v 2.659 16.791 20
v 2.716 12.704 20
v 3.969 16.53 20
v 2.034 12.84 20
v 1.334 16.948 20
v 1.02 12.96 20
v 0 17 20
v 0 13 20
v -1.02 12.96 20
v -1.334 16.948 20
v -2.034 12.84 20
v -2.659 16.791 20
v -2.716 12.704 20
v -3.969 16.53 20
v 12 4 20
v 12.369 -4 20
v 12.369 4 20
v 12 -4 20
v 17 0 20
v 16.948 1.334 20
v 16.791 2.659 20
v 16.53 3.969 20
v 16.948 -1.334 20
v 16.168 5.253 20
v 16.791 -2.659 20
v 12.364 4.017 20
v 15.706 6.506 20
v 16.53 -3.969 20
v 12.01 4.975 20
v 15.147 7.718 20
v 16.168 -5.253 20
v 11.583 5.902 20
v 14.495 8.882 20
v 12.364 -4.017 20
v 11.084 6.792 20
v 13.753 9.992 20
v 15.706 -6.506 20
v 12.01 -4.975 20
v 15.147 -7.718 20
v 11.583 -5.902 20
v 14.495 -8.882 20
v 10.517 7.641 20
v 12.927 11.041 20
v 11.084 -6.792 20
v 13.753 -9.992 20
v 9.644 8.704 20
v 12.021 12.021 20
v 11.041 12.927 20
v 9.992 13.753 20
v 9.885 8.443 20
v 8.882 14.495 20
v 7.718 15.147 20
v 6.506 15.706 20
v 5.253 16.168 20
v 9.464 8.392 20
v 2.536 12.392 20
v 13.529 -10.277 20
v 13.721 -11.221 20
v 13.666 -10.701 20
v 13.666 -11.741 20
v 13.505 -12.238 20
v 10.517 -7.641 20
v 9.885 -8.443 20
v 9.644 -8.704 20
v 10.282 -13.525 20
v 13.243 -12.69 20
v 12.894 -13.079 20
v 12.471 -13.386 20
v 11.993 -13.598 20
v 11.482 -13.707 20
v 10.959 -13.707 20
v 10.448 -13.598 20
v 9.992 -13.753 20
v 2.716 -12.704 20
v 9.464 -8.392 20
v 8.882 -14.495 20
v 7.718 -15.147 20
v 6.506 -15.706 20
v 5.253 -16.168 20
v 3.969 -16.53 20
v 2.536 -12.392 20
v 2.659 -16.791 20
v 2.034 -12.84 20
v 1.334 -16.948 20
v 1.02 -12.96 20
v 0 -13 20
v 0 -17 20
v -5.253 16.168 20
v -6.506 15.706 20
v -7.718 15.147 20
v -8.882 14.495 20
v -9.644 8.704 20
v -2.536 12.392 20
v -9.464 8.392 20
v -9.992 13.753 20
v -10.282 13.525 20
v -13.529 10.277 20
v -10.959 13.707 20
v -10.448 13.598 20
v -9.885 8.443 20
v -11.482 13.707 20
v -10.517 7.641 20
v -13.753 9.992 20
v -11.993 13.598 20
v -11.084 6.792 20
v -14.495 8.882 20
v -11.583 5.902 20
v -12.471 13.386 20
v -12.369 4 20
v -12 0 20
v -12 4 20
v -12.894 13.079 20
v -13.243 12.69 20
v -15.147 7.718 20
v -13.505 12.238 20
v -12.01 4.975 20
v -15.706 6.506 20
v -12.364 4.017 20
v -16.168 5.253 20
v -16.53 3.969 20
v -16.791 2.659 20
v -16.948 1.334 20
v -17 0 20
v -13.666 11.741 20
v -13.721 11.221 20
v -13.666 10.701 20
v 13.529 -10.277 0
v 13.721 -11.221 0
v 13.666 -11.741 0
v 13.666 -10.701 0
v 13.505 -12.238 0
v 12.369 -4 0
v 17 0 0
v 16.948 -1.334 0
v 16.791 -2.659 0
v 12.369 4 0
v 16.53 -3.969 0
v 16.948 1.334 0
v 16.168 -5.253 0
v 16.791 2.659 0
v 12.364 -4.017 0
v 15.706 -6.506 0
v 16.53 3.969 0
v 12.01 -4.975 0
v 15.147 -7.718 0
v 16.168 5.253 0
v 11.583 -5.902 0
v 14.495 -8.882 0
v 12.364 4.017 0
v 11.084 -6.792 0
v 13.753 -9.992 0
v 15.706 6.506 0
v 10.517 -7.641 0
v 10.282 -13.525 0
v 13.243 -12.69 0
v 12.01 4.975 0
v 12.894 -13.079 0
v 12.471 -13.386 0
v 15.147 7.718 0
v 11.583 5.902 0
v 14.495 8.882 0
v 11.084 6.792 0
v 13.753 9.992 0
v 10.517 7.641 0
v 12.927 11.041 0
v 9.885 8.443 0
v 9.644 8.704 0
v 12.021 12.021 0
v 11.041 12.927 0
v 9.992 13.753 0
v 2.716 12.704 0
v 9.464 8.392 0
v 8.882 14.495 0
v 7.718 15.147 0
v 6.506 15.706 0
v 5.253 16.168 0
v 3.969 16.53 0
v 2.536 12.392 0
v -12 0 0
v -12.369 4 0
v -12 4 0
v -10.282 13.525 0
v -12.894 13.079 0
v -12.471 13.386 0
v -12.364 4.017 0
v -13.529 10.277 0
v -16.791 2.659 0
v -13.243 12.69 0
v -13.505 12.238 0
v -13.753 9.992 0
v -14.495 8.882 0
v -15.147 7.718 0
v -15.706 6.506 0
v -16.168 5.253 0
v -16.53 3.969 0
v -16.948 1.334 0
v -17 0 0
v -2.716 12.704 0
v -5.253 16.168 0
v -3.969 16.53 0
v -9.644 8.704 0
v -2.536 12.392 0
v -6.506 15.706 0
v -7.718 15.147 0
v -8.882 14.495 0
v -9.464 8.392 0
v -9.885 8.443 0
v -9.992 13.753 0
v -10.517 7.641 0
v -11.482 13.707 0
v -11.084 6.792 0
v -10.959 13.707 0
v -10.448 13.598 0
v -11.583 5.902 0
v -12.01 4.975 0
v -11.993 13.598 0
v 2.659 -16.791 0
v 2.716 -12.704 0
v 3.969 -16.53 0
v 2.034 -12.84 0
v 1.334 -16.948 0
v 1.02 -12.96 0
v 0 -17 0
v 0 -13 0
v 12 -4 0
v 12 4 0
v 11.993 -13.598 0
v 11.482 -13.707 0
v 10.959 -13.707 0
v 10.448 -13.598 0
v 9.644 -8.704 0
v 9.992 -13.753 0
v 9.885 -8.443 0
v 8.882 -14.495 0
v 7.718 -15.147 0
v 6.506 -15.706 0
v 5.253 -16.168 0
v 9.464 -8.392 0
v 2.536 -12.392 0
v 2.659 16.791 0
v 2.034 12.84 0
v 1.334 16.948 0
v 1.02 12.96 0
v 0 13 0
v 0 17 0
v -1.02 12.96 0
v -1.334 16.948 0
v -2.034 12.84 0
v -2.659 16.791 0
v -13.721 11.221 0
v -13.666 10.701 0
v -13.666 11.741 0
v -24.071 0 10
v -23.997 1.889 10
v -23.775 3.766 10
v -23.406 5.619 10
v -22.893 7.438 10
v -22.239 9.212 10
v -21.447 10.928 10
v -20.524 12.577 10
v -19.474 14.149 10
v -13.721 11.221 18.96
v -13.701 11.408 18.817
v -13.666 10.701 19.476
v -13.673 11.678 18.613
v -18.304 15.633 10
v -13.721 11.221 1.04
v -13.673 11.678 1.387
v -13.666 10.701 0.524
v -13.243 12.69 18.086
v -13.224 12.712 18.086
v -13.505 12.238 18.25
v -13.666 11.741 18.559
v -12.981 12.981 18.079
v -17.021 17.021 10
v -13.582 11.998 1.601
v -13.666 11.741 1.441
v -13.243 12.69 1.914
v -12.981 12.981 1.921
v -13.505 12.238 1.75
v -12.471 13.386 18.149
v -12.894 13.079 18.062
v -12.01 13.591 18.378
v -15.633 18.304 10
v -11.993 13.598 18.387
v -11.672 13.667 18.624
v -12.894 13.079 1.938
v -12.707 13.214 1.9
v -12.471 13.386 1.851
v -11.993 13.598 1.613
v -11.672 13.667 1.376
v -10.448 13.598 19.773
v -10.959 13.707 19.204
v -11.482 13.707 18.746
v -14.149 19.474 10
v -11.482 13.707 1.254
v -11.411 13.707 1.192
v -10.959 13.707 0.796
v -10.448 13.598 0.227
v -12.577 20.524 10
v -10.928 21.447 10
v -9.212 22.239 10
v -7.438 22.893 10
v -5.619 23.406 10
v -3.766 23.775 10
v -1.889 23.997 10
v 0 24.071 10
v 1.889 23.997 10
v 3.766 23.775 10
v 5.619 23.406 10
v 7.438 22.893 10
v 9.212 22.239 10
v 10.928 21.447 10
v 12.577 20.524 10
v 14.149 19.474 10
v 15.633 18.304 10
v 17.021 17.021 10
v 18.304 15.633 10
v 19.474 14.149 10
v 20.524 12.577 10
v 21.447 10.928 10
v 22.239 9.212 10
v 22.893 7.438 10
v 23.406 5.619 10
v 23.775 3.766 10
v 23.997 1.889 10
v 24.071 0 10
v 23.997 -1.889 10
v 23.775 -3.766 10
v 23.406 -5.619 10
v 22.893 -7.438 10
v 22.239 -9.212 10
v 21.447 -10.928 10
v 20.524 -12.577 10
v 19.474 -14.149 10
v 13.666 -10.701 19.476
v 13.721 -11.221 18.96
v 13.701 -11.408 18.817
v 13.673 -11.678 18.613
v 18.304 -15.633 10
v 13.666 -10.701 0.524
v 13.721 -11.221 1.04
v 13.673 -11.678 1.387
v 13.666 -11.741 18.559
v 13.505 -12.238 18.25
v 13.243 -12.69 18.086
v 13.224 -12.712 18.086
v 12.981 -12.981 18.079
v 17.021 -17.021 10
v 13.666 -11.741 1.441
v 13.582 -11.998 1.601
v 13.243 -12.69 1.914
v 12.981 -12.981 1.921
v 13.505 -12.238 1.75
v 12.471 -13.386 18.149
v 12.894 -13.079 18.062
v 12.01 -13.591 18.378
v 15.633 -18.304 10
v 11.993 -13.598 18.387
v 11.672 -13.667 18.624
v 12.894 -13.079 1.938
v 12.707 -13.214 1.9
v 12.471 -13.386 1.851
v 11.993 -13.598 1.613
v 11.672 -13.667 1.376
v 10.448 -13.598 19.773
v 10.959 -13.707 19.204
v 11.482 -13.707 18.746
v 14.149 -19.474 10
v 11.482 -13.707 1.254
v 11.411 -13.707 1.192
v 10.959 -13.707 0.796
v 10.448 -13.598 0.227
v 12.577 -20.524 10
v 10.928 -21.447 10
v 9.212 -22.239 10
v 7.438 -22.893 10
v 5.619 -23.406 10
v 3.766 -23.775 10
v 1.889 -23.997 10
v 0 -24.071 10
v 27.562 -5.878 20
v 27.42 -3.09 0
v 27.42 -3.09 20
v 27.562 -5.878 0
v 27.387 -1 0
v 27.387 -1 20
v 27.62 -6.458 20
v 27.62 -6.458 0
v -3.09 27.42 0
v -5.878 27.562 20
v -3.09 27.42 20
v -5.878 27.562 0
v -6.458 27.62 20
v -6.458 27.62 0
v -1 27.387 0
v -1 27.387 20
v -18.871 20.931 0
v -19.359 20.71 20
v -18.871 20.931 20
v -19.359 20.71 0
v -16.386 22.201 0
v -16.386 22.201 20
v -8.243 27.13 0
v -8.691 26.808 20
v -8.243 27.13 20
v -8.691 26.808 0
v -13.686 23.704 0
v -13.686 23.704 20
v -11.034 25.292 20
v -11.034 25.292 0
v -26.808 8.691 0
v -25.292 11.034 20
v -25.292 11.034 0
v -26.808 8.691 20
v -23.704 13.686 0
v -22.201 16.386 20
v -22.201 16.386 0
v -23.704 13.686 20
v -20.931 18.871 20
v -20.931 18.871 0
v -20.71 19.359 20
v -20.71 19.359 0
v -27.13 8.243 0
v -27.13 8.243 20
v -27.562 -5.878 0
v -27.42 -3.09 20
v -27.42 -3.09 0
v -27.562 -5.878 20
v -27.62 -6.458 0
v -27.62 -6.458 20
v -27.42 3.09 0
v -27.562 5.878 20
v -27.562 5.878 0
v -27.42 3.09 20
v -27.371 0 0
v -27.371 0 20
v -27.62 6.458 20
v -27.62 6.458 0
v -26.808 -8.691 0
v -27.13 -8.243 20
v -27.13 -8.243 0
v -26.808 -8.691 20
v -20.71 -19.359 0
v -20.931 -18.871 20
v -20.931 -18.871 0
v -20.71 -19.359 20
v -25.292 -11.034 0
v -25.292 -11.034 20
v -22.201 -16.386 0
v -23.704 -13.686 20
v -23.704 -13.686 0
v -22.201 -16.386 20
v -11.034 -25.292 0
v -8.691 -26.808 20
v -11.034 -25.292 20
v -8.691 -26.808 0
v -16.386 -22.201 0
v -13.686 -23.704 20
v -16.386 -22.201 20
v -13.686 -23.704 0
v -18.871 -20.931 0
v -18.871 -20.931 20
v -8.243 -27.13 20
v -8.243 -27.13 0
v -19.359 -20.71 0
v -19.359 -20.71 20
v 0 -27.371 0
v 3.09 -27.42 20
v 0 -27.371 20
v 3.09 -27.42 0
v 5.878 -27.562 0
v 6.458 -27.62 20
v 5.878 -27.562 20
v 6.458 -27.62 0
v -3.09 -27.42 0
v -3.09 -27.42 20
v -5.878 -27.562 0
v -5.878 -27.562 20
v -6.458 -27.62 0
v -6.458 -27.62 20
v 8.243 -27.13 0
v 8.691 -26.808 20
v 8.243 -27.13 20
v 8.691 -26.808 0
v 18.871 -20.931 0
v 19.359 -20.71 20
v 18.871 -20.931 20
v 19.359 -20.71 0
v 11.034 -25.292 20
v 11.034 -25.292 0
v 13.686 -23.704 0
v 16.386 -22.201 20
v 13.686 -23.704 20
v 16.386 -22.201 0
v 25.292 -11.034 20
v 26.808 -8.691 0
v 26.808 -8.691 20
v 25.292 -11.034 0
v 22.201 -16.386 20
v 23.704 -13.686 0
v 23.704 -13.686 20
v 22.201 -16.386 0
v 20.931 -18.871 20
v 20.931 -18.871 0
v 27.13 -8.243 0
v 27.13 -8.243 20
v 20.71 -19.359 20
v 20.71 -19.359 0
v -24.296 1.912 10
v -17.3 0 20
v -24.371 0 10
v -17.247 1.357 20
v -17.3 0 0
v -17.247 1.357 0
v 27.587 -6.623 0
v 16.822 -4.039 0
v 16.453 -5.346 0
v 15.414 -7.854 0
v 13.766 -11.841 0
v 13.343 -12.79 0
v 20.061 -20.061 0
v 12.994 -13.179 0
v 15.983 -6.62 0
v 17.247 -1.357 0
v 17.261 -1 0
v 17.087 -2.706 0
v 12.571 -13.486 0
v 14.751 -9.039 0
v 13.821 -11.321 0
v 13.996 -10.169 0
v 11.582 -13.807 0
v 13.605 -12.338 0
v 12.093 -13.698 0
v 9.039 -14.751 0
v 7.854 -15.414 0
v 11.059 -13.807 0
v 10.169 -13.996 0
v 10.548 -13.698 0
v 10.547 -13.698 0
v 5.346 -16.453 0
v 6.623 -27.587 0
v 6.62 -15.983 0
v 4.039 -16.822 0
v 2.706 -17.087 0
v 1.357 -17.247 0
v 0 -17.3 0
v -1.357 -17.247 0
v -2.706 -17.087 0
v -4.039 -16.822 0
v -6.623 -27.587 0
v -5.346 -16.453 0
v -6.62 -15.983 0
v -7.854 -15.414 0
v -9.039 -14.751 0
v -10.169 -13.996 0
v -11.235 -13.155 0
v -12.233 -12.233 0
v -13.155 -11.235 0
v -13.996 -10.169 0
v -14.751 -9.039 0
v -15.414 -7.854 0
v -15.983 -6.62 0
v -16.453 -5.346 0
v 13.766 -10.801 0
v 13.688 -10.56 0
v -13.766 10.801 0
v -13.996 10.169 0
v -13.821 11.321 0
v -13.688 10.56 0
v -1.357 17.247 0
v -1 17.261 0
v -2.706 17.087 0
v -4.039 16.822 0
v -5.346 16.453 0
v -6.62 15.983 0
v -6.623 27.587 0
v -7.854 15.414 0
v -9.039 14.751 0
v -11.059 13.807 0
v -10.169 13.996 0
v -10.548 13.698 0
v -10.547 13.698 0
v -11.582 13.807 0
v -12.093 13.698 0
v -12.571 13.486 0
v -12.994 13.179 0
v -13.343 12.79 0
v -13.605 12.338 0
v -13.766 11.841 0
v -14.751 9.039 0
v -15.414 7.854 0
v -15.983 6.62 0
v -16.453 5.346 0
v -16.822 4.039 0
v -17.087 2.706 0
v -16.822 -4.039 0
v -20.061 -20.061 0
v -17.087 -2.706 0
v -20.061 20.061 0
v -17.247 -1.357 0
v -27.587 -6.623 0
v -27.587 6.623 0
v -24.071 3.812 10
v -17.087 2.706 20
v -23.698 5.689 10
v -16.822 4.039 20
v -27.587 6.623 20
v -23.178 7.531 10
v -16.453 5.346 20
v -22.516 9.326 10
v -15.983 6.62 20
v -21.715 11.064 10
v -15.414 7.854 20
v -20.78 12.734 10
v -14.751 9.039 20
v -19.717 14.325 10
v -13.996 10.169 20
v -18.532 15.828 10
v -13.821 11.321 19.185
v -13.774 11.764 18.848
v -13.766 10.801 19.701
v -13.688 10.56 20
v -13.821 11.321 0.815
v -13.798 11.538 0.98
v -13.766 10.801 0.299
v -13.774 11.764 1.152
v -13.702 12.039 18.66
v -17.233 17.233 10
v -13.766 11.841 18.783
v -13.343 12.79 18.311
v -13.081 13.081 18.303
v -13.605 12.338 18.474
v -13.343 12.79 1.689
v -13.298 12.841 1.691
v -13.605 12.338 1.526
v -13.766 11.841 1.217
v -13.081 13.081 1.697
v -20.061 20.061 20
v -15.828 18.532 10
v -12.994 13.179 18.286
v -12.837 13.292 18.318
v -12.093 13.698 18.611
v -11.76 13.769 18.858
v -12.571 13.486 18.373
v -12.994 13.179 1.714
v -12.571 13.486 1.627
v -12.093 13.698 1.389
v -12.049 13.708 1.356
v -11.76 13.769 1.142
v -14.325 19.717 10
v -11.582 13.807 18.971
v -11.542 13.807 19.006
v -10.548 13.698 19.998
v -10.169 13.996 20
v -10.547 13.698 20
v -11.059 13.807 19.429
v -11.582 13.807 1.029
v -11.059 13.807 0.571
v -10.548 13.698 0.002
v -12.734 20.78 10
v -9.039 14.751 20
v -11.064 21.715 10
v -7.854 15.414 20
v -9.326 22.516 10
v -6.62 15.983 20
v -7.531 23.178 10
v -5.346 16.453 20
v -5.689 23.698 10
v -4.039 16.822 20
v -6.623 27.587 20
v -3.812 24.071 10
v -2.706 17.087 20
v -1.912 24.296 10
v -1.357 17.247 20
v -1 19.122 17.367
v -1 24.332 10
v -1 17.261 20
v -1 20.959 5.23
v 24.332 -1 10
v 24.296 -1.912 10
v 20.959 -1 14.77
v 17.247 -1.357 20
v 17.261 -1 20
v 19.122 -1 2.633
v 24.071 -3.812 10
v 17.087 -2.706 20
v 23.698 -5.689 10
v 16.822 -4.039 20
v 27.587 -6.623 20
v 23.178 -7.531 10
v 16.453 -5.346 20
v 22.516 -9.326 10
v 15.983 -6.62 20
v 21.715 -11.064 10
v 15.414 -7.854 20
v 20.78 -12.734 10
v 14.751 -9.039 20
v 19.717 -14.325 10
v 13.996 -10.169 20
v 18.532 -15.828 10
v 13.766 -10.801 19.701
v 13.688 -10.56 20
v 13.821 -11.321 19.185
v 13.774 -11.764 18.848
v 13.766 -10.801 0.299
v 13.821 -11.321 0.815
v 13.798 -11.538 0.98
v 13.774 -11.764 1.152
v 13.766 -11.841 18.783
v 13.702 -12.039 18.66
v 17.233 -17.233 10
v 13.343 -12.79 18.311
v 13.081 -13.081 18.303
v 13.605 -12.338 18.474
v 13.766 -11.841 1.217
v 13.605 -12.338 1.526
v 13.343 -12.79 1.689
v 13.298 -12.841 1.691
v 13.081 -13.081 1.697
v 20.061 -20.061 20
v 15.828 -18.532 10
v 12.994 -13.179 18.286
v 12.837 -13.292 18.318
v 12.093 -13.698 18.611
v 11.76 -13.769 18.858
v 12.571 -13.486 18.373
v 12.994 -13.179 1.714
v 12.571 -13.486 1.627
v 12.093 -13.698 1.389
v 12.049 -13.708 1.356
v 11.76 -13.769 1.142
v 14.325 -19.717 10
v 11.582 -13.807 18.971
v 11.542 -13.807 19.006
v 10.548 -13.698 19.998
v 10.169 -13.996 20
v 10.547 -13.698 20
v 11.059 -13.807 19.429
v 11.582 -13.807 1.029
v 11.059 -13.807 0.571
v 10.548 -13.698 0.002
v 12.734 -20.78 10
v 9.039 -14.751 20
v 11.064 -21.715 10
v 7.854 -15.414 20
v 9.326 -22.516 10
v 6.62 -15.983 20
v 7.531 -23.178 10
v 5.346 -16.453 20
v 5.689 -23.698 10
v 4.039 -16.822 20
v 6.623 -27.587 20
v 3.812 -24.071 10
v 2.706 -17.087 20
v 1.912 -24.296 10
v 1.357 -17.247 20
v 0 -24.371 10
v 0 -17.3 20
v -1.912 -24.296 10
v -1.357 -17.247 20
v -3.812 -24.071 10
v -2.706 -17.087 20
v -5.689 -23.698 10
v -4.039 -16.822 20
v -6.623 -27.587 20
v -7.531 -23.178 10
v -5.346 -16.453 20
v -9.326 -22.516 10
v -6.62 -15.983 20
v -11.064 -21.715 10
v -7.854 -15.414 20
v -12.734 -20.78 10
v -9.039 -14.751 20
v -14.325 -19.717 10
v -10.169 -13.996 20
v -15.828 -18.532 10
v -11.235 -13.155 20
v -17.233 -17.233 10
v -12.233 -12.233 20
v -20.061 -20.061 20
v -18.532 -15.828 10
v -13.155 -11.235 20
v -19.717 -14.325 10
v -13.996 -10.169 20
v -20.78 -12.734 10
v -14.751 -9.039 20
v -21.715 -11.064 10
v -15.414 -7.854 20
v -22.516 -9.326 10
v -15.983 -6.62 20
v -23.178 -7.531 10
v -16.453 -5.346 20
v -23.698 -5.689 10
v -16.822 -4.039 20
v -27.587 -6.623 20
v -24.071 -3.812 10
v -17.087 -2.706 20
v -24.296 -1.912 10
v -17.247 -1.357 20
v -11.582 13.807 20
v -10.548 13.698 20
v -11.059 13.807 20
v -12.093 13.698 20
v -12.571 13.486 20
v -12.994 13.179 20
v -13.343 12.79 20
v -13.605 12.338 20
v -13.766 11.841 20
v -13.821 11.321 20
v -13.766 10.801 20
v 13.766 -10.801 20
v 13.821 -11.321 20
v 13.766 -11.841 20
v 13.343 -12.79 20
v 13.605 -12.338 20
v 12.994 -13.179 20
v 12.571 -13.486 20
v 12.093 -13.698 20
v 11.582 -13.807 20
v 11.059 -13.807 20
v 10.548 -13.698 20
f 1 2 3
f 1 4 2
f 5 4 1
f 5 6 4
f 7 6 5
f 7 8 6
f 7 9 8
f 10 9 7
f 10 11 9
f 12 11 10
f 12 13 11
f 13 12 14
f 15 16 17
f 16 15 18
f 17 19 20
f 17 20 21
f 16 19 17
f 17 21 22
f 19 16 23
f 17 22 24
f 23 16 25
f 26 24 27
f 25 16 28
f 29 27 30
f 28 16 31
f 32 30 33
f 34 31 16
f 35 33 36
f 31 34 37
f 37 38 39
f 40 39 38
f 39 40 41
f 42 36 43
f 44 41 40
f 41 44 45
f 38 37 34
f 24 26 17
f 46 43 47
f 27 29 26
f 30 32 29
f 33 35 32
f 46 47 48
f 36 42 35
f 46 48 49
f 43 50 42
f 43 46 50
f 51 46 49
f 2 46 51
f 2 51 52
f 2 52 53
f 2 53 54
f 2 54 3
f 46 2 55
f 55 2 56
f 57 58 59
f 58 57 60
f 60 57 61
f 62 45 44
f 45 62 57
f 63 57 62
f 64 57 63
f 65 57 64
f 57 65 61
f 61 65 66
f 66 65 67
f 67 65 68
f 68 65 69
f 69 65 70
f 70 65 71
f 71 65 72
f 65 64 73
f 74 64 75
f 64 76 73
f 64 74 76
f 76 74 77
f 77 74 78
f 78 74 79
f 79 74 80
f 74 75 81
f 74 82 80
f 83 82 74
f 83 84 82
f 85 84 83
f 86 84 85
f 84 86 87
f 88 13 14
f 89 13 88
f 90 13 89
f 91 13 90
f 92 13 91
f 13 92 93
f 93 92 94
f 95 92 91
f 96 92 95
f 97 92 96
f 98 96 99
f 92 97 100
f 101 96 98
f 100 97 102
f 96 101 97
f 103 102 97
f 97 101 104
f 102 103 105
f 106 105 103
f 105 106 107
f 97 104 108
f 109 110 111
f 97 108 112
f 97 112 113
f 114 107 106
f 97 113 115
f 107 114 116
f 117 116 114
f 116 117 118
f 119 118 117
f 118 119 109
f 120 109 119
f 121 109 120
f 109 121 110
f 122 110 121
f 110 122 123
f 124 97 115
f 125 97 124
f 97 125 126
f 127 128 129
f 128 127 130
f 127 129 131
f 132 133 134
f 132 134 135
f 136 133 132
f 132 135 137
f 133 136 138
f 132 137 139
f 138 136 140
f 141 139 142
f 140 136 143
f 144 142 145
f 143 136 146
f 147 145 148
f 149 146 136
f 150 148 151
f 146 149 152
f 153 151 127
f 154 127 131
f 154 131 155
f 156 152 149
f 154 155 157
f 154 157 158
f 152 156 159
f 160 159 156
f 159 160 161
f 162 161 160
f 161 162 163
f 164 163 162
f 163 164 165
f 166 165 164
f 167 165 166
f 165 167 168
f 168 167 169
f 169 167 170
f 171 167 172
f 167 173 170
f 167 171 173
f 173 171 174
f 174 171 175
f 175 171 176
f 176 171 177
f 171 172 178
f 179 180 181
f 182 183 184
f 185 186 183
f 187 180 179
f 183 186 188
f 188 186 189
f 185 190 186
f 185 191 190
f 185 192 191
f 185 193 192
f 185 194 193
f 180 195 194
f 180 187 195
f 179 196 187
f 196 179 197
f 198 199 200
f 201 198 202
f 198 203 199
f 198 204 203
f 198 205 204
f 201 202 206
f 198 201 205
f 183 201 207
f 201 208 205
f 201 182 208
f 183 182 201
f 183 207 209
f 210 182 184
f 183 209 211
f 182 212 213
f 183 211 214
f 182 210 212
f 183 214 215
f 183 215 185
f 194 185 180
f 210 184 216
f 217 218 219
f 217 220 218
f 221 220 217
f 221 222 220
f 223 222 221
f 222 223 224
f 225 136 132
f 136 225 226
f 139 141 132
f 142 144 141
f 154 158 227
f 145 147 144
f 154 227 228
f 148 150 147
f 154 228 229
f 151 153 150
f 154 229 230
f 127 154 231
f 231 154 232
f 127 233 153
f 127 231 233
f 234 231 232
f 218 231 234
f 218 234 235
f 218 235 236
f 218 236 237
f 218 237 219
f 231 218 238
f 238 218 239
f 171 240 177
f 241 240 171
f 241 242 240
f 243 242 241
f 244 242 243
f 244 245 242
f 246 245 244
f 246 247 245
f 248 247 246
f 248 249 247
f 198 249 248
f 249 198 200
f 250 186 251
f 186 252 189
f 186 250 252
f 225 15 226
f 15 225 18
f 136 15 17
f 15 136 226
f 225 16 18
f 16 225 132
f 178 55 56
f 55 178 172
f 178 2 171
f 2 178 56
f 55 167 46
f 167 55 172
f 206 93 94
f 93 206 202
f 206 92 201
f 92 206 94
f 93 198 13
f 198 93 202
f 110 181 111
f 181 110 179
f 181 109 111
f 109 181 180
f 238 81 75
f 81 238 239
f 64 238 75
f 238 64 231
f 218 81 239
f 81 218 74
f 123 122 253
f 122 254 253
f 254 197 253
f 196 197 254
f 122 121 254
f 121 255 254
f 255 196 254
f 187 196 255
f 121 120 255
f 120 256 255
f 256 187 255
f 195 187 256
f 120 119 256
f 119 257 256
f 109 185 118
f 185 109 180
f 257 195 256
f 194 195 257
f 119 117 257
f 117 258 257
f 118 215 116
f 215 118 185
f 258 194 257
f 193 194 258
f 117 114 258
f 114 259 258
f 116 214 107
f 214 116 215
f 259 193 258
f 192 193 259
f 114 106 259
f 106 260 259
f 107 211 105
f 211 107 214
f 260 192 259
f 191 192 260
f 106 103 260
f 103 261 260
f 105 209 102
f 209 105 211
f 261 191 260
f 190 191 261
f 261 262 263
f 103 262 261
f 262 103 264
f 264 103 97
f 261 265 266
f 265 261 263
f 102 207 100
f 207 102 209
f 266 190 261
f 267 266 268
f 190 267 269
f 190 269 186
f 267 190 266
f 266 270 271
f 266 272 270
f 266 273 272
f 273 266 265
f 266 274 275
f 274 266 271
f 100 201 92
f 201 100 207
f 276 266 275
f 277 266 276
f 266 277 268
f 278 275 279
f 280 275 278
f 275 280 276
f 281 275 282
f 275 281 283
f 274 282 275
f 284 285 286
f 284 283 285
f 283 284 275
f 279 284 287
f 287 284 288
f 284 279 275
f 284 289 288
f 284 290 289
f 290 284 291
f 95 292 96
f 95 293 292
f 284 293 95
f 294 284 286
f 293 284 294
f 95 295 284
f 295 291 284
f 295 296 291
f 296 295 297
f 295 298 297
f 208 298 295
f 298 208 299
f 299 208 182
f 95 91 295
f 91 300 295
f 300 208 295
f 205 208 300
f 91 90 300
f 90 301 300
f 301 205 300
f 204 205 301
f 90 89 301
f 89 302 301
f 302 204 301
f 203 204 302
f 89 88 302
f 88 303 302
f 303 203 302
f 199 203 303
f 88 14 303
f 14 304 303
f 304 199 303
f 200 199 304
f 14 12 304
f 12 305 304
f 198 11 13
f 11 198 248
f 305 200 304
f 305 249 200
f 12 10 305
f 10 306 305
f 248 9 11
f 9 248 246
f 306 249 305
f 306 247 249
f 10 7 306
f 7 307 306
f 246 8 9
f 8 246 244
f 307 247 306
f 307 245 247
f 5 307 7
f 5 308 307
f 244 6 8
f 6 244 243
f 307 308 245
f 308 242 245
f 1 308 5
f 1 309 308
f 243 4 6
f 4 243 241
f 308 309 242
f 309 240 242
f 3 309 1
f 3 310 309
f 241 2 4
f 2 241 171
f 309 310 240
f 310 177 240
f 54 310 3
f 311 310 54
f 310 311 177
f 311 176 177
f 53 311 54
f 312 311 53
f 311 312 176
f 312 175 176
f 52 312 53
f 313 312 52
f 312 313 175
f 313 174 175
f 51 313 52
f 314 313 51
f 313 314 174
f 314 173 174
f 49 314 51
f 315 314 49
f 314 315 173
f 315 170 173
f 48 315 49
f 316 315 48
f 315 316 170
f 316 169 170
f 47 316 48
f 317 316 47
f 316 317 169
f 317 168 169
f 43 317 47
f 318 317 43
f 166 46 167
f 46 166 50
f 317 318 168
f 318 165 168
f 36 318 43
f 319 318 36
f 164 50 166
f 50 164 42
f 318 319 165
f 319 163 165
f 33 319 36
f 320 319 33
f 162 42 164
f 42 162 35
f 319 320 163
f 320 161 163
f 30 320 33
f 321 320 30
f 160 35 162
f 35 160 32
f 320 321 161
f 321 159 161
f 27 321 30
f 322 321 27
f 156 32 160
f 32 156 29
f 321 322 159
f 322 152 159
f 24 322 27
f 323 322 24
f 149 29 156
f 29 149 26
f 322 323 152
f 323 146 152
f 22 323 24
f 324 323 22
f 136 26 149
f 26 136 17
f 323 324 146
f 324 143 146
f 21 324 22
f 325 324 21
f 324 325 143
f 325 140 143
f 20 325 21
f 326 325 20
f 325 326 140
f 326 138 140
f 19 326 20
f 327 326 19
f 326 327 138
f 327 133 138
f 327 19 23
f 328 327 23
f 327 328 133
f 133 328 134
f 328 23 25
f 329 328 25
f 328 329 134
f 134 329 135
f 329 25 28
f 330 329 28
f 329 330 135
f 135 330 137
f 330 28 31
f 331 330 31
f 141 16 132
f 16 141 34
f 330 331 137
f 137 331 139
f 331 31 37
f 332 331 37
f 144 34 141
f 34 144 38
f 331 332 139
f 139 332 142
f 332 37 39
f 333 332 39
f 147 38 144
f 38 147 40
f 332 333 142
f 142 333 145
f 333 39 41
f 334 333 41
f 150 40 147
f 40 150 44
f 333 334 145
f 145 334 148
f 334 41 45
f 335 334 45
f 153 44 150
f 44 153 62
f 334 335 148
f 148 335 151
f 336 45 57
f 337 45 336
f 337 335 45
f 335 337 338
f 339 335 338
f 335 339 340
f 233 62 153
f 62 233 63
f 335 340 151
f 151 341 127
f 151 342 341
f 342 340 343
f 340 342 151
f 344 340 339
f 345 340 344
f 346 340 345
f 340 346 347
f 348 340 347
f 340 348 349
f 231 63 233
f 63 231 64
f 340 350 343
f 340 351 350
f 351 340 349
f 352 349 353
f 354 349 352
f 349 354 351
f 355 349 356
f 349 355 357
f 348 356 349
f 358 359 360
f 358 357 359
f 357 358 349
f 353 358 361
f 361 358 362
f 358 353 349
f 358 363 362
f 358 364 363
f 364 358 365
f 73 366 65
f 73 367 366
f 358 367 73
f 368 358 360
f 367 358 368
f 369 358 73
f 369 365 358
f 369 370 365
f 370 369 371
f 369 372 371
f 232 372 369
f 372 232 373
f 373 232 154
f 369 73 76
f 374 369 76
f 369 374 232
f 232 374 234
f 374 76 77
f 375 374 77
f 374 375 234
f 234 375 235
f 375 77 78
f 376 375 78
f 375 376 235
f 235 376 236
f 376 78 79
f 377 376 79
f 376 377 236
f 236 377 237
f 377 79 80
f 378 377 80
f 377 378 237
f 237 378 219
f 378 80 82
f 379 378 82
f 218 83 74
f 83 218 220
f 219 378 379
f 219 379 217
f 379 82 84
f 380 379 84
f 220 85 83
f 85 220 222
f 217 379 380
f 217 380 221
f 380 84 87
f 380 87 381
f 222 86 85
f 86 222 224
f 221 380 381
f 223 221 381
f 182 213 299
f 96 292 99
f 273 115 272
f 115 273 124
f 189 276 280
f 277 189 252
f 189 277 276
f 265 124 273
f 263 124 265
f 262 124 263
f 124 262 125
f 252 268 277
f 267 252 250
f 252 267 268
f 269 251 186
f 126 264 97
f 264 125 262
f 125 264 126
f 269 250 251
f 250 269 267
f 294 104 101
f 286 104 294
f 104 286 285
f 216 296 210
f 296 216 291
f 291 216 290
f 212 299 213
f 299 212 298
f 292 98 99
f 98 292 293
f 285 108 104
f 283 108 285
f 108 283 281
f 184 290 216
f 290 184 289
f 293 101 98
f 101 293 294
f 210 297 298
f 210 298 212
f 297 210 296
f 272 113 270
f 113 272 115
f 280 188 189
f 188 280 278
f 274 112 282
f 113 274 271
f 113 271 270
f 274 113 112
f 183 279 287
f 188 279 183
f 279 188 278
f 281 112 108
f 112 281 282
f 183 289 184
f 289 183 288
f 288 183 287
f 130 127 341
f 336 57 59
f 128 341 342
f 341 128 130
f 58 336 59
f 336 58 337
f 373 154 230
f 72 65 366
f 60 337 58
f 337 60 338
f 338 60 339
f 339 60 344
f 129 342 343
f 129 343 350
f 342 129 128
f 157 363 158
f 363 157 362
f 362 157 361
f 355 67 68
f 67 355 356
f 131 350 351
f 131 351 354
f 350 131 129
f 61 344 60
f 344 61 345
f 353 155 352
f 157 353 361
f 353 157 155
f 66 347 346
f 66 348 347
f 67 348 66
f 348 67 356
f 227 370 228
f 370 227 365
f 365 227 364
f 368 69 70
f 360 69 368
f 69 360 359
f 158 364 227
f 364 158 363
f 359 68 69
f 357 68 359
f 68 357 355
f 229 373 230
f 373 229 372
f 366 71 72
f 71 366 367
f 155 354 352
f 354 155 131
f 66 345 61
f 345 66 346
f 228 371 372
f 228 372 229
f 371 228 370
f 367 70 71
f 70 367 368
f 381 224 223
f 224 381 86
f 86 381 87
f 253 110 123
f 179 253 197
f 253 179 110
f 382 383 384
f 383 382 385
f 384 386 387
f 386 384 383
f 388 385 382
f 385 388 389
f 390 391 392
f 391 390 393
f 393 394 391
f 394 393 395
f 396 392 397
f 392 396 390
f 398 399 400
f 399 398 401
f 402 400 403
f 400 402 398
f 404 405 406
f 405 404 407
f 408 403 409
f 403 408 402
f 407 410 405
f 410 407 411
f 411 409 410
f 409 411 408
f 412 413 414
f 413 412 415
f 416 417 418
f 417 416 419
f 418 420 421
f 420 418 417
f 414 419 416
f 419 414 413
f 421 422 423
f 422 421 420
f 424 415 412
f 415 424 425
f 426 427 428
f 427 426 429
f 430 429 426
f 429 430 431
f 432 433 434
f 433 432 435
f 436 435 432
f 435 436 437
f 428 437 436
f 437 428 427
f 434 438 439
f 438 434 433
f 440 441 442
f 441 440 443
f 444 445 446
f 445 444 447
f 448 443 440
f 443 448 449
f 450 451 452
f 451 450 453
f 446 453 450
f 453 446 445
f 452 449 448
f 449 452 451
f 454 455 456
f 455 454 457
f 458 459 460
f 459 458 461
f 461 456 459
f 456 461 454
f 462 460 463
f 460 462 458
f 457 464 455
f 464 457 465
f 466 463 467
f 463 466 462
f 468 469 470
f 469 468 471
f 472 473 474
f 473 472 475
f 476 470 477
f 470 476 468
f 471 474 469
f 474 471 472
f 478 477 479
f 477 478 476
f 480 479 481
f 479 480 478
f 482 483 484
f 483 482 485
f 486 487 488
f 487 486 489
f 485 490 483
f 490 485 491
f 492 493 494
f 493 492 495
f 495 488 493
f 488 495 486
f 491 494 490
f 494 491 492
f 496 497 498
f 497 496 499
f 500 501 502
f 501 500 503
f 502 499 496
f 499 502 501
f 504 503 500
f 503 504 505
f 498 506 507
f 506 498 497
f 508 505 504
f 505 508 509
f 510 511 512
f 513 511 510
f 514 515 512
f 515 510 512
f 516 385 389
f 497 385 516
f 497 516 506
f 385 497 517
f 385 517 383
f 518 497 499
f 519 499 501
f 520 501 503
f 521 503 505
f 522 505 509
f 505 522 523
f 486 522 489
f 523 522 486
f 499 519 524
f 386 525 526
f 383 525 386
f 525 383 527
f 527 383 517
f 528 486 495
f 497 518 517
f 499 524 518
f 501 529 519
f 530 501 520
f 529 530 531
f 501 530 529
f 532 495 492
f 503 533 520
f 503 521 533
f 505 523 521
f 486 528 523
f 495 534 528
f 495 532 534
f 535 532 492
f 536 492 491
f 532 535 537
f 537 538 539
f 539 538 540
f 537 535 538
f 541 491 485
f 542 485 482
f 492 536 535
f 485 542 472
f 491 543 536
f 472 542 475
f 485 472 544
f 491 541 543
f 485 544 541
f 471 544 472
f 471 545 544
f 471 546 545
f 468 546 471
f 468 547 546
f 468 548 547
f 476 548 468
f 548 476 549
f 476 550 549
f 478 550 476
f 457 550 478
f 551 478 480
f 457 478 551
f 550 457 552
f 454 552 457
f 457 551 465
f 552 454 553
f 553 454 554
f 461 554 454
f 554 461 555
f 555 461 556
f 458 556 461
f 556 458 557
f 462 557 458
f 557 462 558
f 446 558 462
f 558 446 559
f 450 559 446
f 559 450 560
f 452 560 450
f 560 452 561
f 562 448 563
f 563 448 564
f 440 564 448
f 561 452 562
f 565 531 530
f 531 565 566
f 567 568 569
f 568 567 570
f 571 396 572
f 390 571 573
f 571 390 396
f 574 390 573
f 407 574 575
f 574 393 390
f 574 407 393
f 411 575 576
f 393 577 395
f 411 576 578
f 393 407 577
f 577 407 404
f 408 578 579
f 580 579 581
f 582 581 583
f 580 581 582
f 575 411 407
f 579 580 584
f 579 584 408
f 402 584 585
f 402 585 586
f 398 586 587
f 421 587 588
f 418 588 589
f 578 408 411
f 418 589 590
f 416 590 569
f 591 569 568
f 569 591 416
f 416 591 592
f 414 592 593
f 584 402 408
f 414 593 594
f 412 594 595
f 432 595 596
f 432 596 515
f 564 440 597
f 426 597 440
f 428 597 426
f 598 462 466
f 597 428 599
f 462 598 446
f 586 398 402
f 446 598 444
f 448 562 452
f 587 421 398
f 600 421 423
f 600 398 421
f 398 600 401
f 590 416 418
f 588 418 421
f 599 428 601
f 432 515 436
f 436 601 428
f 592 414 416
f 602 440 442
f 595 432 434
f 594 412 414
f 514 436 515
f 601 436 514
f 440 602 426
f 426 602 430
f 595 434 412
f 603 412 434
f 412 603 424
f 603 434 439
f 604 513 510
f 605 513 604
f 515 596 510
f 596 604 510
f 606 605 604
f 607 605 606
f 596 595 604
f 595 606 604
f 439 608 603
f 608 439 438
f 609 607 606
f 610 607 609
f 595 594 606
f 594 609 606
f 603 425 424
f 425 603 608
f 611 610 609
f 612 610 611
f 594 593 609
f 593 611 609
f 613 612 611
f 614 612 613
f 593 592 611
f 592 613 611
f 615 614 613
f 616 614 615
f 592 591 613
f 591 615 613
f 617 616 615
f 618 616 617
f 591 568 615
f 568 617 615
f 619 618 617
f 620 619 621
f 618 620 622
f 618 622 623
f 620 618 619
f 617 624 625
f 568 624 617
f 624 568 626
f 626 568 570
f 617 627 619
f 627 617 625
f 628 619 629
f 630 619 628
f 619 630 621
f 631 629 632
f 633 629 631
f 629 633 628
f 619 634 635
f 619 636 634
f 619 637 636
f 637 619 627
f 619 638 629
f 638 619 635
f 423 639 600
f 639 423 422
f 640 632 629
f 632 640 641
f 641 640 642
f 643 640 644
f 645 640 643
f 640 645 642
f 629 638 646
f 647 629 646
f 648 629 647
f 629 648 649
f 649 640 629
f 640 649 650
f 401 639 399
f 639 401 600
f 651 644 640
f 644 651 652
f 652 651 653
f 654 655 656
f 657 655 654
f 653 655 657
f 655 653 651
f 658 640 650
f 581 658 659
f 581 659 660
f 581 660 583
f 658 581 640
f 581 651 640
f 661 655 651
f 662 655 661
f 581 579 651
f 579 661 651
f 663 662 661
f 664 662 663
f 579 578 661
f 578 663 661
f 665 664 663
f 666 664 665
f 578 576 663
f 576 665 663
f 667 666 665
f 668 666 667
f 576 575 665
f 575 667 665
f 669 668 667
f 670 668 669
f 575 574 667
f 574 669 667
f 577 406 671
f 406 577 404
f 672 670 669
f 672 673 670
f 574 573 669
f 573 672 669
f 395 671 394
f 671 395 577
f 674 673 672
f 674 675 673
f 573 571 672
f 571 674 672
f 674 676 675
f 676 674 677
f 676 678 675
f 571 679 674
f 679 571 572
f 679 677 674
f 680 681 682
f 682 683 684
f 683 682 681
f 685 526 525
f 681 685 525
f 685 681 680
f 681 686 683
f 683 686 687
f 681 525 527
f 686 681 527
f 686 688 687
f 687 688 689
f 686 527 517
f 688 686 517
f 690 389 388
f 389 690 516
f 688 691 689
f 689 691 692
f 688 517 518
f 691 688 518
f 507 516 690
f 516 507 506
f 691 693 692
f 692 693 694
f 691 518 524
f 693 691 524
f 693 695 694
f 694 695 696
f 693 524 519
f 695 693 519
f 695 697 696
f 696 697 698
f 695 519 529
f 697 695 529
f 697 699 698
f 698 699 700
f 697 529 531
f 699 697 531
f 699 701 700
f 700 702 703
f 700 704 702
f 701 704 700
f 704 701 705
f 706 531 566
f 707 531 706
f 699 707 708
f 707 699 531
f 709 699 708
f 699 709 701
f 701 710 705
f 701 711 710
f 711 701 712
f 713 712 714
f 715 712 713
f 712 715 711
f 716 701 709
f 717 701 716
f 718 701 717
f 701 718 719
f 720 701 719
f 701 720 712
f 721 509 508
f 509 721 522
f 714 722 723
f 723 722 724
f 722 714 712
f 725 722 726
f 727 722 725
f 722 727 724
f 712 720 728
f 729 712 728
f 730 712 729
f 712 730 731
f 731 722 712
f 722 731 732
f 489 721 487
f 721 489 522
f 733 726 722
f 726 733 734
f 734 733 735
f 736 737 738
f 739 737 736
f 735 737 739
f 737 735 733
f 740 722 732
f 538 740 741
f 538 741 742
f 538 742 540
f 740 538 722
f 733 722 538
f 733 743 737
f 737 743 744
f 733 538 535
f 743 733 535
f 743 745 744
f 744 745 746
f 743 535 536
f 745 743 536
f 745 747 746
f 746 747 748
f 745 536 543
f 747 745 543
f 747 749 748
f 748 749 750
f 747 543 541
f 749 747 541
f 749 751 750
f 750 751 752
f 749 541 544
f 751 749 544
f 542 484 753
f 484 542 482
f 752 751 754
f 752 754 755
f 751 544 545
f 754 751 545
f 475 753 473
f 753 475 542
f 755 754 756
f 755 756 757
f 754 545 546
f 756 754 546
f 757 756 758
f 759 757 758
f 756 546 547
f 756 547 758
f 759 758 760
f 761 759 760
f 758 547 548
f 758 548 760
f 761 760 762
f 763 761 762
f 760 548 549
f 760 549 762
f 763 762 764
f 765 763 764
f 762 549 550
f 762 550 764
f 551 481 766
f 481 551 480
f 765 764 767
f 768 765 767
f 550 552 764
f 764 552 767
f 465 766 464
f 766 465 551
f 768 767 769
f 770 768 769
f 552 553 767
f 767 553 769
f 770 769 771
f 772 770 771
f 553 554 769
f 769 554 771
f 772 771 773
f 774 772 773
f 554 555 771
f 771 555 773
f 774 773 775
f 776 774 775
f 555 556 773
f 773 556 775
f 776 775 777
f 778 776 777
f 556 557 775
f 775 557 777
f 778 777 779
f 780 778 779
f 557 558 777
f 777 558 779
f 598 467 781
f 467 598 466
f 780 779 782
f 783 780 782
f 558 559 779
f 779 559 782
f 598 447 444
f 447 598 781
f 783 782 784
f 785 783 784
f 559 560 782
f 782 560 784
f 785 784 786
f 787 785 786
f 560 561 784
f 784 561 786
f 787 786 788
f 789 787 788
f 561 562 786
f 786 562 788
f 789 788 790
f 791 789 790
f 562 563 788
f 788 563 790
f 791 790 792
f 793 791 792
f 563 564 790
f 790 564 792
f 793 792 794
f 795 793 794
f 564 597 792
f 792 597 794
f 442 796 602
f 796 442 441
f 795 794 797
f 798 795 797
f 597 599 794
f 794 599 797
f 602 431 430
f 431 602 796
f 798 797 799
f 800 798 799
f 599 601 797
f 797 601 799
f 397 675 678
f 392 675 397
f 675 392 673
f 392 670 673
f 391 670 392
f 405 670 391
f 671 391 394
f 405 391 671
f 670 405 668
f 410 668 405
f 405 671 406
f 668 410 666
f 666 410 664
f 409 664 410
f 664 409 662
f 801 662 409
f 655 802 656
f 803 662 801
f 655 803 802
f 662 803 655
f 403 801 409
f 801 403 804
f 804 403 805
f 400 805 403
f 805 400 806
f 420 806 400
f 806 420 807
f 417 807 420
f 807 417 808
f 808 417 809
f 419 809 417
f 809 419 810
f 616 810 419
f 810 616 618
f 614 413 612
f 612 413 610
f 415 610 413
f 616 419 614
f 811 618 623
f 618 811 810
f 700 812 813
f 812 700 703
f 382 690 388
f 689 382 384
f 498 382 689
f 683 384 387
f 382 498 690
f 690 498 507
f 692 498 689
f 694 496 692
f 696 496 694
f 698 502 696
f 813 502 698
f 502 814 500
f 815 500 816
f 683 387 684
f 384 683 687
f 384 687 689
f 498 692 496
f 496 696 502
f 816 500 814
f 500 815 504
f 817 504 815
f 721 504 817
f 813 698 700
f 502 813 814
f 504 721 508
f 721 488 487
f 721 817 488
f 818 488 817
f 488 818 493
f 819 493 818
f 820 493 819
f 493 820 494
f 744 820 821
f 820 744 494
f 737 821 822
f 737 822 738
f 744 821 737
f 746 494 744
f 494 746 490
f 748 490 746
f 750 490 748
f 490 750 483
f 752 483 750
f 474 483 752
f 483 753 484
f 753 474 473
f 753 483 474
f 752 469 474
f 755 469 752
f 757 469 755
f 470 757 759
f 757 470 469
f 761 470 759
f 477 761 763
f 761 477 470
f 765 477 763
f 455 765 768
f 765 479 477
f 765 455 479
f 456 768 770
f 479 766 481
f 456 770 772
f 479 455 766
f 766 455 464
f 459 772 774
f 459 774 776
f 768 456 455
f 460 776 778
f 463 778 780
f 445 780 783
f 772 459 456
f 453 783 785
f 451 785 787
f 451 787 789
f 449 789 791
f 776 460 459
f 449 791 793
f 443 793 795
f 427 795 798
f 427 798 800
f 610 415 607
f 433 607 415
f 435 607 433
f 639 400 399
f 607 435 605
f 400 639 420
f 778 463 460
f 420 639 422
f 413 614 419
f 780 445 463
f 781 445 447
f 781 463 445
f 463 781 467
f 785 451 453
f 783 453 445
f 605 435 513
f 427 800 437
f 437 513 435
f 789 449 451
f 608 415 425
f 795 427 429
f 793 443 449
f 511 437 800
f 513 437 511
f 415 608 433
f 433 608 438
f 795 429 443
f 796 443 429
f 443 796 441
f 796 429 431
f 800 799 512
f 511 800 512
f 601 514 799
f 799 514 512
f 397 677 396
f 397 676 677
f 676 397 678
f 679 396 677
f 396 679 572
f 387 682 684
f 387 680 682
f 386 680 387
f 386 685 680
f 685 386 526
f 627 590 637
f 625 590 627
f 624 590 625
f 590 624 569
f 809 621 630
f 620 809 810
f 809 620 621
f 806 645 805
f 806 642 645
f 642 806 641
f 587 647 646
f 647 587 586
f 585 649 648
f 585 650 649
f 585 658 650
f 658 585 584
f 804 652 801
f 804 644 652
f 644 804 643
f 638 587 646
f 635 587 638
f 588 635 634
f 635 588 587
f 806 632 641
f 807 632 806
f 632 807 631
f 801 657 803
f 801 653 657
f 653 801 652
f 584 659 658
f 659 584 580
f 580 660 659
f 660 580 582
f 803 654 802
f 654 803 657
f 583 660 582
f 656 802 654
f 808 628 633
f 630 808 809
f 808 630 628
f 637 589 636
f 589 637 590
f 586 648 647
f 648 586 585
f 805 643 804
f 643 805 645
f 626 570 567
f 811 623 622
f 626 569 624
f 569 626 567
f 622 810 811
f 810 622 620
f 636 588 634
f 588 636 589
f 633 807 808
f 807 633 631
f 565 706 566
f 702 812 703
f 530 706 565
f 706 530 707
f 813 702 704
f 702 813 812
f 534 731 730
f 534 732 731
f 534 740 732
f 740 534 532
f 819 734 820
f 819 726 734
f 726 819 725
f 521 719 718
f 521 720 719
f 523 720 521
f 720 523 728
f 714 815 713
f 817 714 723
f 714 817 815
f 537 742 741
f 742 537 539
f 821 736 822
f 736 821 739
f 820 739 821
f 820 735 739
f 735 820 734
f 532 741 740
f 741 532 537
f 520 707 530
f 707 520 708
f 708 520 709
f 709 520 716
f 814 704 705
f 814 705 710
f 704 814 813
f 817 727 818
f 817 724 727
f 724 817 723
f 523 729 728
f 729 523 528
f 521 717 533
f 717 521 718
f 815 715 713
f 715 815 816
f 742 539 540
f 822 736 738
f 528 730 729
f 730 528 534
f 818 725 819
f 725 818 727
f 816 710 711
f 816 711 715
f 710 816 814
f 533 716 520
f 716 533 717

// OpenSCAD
/* The goal is to replicate a rotating cable "tie".
 * I have one for reference but I lost where I got the orignal from *shrug*
 * units in mm.
 */

height = 20;
gap = 0.3; // printing with a 0.6 mm nozzle. The original seems to be < 0.1
inner_radius= 13;
inner_contact_radius = 4;
half_height = height / 2;
inset_at_half_height = cos(45) * half_height;
outer_radius = inner_radius + inner_contact_radius + inset_at_half_height + gap + 4;
detent_radius = 2.5;

module inner_ring() {
    inner_section_points =
        [
         [inner_radius, 0],
         [inner_radius + inner_contact_radius, 0],
         [inner_radius + inner_contact_radius + inset_at_half_height, half_height],
         [inner_radius + inner_contact_radius, height],
         [inner_radius, height],
        ];

    module full_inner_ring() {
        rotate_extrude($fn = 80) {
            polygon(inner_section_points);
        }
    }

    module inner_grip_slots() {
        sx = 1;
        sy = 8;
        for( r = [0 : 60 : 360] ) {
            rotate(r, [0, 0, 1]) {
                translate([inner_radius - sx, -sy/2, 0]) {
                    cube([sx, sy, height]);
                }
            }
        }
    }

    difference() {
        union() {
            full_inner_ring();
            inner_grip_slots();

            r = cos(45)*(inner_radius + inner_contact_radius)-0.8;
            translate([-r, r, 0]) cylinder(h = height, r = detent_radius, $fn = 30);
            translate([r, -r, 0]) cylinder(h = height, r = detent_radius, $fn = 30);
        }
        // sw (-x, -y) chunk if viewed from above
        s = inner_radius + inner_contact_radius + inset_at_half_height;

        // huh.. I guess I could have rotated the profile 270 instead
        translate([-s - 2, -s - 2, -1]) {
            cube(size = [s + 2, s + 2, height + 2]);
        }
    }
}

module outer_ring() {
    outer_section_points  =
        [
         [ inner_radius + inner_contact_radius + gap, 0],
         [ outer_radius, 0 ],
         [ outer_radius, height ],
         [ inner_radius + inner_contact_radius + gap, height],
         [ inner_radius + inner_contact_radius + inset_at_half_height + gap, half_height],
         ];
    module full_outer_ring() {
        rotate_extrude($fn = 80) {
            polygon(outer_section_points);
        }
    }

    module outer_grip_slots() {
        sx = 1;
        sy = 10;
        for( r = [0 : 30 : 360] ) {
            rotate(r, [0, 0, 1]) {
                translate([outer_radius, 0, -1 ]) {
                    scale([1, 10, 1]) cylinder(h = height + 2, r = sx, $fn = 20);
                }
            }
        }
    }

    difference() {
        full_outer_ring();
        s = outer_radius;
        translate([-1, -1, -1]) cube(size = [s + 2, s + 2, height + 2]);

        // that is equivalent to the original model. Now for extras
        outer_grip_slots();

        r = cos(45)*(inner_radius + inner_contact_radius)-0.7;
        translate([-r, r, -1]) cylinder(h = height+2, r = detent_radius, $fn = 30);
        translate([r, -r, -1]) cylinder(h = height+2, r = detent_radius, $fn = 30);
    }
}

inner_ring();
outer_ring();
